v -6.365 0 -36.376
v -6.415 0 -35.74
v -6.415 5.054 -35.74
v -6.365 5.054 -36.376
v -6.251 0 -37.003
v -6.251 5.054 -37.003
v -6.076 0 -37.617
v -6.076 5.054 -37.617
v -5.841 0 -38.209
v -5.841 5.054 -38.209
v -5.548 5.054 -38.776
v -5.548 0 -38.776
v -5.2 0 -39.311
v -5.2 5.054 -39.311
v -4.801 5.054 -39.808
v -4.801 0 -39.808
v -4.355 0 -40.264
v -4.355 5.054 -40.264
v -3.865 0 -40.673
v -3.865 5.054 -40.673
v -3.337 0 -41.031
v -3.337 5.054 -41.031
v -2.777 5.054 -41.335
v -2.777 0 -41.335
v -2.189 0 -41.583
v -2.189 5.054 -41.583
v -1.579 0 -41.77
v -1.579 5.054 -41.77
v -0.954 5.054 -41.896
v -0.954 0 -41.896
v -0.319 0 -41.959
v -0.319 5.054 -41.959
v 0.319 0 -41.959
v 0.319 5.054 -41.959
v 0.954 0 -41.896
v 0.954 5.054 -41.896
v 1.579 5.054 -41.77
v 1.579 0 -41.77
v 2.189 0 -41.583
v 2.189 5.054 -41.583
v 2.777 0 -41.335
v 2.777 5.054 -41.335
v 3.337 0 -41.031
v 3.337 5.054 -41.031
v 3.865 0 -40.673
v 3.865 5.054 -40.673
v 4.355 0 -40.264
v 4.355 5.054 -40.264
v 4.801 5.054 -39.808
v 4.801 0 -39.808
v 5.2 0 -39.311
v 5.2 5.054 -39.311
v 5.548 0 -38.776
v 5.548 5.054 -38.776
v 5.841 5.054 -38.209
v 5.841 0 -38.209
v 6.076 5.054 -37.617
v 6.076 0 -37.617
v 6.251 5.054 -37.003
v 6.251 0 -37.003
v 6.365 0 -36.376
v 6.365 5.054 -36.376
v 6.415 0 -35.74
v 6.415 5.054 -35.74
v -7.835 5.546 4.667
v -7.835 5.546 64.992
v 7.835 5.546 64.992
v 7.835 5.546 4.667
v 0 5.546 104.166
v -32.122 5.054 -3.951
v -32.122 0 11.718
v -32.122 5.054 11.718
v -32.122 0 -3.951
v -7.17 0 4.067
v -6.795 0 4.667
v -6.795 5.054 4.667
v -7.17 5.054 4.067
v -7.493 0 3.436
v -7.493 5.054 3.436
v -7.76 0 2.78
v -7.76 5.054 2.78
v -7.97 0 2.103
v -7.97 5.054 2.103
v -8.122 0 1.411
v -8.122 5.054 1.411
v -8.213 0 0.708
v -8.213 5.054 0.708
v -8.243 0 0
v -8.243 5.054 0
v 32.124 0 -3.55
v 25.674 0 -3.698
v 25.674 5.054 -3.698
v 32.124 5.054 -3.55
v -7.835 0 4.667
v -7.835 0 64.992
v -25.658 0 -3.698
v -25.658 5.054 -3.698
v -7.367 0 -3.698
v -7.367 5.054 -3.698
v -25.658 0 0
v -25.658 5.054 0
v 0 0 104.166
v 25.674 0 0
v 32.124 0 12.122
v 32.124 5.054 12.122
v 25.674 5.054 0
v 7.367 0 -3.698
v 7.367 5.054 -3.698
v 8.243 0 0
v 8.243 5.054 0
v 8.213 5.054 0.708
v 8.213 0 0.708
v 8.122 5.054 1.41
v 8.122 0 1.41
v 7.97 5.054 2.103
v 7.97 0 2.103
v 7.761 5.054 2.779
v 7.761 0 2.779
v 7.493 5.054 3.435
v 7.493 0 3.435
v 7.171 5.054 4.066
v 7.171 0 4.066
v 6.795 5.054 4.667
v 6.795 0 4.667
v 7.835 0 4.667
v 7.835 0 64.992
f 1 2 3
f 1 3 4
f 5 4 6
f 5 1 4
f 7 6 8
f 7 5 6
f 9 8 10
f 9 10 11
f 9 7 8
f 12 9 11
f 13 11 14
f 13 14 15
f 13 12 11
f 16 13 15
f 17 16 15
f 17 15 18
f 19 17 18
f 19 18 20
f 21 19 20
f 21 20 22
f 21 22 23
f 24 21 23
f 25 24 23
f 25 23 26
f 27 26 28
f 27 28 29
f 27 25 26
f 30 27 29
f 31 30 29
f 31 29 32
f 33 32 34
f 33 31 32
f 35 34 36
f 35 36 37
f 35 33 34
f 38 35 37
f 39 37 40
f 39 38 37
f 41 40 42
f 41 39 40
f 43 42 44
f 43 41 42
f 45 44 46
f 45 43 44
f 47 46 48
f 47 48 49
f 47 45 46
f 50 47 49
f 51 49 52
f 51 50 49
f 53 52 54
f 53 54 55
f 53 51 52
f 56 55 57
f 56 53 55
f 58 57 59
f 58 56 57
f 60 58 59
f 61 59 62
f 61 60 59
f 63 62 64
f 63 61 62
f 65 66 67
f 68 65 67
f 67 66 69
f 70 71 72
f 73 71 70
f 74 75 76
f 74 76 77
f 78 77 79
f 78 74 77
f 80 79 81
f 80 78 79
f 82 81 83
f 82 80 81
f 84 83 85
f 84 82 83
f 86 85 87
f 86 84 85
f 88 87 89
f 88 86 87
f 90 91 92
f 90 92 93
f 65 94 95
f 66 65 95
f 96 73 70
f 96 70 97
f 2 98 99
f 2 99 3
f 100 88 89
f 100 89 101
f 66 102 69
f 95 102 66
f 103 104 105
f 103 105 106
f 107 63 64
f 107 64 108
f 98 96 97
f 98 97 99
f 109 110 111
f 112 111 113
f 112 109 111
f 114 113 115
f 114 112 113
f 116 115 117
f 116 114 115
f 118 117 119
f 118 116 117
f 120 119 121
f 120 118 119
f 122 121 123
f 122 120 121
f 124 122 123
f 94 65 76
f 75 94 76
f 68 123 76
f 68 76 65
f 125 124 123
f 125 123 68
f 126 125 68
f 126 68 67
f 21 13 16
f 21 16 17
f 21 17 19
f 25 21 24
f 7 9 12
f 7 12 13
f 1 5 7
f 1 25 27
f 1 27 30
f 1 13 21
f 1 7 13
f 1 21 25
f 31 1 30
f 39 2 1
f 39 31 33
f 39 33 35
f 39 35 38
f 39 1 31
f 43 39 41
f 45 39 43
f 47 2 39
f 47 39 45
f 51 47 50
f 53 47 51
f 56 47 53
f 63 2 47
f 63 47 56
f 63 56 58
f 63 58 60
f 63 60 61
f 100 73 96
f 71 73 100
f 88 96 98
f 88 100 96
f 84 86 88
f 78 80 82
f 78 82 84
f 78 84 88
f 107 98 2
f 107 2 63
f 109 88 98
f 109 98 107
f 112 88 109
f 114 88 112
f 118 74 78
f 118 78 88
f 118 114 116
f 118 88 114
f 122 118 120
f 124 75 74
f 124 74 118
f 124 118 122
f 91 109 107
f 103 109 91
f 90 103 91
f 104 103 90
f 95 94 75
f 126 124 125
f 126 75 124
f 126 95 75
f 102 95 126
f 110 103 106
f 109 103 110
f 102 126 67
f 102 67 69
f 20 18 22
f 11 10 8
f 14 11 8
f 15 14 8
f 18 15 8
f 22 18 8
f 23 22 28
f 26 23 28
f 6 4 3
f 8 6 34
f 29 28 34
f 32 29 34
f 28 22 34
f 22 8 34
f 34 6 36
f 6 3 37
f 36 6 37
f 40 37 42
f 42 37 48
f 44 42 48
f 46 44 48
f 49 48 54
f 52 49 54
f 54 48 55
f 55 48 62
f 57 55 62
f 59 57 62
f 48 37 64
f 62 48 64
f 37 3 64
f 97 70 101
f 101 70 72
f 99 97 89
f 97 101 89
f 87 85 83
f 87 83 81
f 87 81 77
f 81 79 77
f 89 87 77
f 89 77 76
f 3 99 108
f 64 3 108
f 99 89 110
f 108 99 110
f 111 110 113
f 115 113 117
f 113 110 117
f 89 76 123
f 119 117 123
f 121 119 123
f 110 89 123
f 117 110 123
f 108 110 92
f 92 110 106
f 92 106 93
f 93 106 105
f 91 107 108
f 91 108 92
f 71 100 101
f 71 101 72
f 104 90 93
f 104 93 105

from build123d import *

# Parameters (mm, degrees)
F1_DEPTH = 5.05432
F2_W     = 15.6690403819
F2_H     = 21.0551657914
F3_DEPTH = 5.54634


# Not quite as in the source:
# - a feature names something its author has since deleted; it is built from what else it names


with BuildPart() as f1:
    # F0 (on Front) → F1 (new body)
    with BuildSketch(Plane.XZ):
        with BuildLine():
            ThreePointArc((-8.2431294521, 0), (-8.0211144228, -1.9002385587), (-7.3670285487, -3.6981175654))
            ThreePointArc((-7.3670285487, -3.6981175654), (0, -8.2431294521), (7.3670285487, -3.6981175654))
            ThreePointArc((7.3670285487, -3.6981175654), (8.0211144228, -1.9002385587), (8.2431294521, 0))
            Line((8.2431294521, 0), (0, 0))
            Line((0, 0), (-8.2431294521, 0))
        make_face()
        with BuildLine():
            Line((-25.6580412388, -3.6981175654), (-7.3670285487, -3.6981175654))
            ThreePointArc((-7.3670285487, -3.6981175654), (-8.0211144228, -1.9002385587), (-8.2431294521, 0))
            Line((-8.2431294521, 0), (-25.6580412388, 0))
            Line((-25.6580412388, 0), (-25.6580412388, -3.6981175654))
        make_face()
        with BuildLine():
            ThreePointArc((7.3670285487, -3.6981175654), (0, -8.2431294521), (-7.3670285487, -3.6981175654))
            Line((-7.3670285487, -3.6981175654), (-6.4152840294, -35.7396751265))
            ThreePointArc((-6.4152840294, -35.7396751265), (-0.0952885085, -29.131713029), (6.41811349, -35.5491191149))
            ThreePointArc((6.41811349, -35.5491191149), (6.4174060859, -35.6444076234), (6.4152840294, -35.7396751265))
            Line((6.4152840294, -35.7396751265), (7.3670285487, -3.6981175654))
        make_face()
        with BuildLine():
            ThreePointArc((8.2431294521, 0), (8.0211144228, -1.9002385587), (7.3670285487, -3.6981175654))
            Line((7.3670285487, -3.6981175654), (25.6736125353, -3.6981175654))
            Line((25.6736125353, -3.6981175654), (25.6736125353, 0))
            Line((25.6736125353, 0), (8.2431294521, 0))
        make_face()
        with BuildLine():
            ThreePointArc((8.2431294521, 0), (0, 8.2431294521), (-8.2431294521, 0))
            Line((-8.2431294521, 0), (0, 0))
            Line((0, 0), (8.2431294521, 0))
        make_face()
        Polygon((-32.1215167642, -3.9506237954), (-25.6580412388, -3.6981175654), (-25.6580412388, 0), (-32.1215167642, 11.7184091359), align=None)
        with BuildLine():
            ThreePointArc((6.41811349, -35.5491191149), (-0.0952885085, -29.131713029), (-6.4152840294, -35.7396751265))
            ThreePointArc((-6.4152840294, -35.7396751265), (0, -41.9672326049), (6.4152840294, -35.7396751265))
            ThreePointArc((6.4152840294, -35.7396751265), (6.4174060859, -35.6444076234), (6.41811349, -35.5491191149))
        make_face()
        Polygon((25.6736125353, 0), (25.6736125353, -3.6981175654), (32.1235085251, -3.5498465956), (32.1235085251, 12.1219534044), align=None)
    extrude(amount=-F1_DEPTH)

    # F2 (on Front) → F3 (join)
    with BuildSketch(Plane.XZ):
        Polygon((-7.834520191, 64.9923454344), (7.834520191, 64.9923454344), (0, 104.1657105088), align=None)
        with Locations((0, 54.4647625387)):
            Rectangle(F2_W, F2_H)
        Polygon((7.834520191, 4.6665664136), (7.834520191, 26.9957184792), (0, 26.9957184792), (-7.834520191, 26.9957184792), (-7.834520191, 4.6673454344), align=None)
        Polygon((7.834520191, 26.9957184792), (7.834520191, 43.937179643), (-7.834520191, 43.937179643), (-7.834520191, 26.9957184792), (0, 26.9957184792), align=None)
    extrude(amount=-F3_DEPTH)


solid = f1.part
